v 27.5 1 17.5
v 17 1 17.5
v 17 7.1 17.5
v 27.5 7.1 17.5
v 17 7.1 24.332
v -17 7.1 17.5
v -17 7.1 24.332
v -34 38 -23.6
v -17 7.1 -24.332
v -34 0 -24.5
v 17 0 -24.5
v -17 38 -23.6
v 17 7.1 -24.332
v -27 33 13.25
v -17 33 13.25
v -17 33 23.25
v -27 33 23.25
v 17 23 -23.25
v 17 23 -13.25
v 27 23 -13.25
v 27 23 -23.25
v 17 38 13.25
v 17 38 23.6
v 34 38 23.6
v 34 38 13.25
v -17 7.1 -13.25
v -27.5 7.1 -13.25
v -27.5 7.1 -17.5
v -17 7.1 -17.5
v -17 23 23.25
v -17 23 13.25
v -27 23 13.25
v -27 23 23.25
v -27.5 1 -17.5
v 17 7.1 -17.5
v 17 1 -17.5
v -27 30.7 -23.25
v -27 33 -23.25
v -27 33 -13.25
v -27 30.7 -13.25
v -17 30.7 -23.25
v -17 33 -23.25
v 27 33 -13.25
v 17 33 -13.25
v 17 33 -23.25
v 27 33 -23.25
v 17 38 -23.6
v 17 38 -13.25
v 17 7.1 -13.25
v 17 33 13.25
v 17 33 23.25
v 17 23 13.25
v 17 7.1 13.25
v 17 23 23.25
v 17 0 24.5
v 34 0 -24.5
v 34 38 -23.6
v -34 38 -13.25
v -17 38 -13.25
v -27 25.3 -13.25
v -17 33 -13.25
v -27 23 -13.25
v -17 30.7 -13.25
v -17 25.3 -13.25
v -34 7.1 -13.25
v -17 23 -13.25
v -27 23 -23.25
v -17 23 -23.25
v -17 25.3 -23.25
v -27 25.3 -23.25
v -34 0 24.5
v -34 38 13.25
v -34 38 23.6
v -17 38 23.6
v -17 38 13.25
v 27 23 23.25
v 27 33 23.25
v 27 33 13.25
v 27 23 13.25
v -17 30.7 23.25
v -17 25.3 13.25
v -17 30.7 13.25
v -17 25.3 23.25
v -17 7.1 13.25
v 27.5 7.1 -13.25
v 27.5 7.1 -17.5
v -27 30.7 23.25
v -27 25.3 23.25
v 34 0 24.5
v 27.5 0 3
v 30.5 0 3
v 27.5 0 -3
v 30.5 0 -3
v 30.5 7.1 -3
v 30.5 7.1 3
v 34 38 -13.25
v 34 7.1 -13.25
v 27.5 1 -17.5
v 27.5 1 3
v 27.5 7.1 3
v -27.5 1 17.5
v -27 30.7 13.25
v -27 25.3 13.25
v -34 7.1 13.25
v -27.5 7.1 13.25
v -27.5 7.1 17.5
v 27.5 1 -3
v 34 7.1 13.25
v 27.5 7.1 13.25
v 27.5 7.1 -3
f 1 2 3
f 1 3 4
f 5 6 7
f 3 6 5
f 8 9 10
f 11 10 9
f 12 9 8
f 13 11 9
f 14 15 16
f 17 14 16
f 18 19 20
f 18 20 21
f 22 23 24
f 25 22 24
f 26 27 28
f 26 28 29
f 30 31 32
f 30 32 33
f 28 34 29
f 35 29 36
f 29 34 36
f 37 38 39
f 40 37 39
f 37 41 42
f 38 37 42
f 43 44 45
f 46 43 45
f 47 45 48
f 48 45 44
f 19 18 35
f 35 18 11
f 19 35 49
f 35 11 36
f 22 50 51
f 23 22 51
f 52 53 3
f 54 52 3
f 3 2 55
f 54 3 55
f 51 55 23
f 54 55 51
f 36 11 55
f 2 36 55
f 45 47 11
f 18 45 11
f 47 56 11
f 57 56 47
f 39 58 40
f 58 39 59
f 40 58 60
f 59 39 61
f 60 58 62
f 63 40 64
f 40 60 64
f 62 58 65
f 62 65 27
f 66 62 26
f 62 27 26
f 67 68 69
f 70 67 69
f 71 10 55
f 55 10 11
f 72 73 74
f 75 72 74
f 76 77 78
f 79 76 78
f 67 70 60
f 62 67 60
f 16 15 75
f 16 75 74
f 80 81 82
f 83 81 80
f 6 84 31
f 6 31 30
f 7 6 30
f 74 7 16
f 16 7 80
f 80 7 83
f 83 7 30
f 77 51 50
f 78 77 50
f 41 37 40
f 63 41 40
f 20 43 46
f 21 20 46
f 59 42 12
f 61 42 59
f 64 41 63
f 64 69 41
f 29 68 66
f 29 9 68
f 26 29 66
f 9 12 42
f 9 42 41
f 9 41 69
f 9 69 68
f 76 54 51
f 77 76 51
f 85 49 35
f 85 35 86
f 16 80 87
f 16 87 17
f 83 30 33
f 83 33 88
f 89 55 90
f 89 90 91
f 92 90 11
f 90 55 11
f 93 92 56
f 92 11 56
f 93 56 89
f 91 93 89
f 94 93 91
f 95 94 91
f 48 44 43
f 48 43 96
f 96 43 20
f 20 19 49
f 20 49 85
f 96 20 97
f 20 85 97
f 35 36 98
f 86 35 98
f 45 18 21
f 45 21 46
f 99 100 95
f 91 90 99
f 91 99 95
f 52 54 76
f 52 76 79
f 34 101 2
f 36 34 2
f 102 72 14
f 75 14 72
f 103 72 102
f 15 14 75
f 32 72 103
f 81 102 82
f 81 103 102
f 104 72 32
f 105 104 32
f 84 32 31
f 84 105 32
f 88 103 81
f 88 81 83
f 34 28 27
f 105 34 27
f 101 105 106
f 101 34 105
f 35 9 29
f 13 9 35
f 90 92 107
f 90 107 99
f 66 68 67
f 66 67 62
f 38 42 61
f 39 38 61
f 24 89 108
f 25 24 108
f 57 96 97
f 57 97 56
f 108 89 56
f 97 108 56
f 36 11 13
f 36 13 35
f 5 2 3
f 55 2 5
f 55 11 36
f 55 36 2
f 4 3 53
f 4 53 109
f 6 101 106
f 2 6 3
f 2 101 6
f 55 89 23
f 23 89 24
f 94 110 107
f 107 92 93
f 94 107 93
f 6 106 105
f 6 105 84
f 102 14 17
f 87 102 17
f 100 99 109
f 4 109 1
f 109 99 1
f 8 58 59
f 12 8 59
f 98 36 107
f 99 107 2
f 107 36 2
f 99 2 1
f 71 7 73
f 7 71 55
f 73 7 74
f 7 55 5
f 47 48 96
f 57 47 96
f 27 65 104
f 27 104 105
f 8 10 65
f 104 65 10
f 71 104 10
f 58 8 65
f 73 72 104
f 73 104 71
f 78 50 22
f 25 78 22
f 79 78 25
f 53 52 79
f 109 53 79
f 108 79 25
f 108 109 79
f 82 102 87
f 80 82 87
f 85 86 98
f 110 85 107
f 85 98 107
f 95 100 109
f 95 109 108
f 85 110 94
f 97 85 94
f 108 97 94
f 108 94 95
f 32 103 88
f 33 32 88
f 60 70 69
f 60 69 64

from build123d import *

# Parameters (mm, degrees)
SKETCH3_W           = 68
SKETCH3_H           = 49
BOSS_EXTRUDE1_DEPTH = 7.1
SKETCH6_W           = 17
SKETCH6_H           = 11.25
BOSS_EXTRUDE2_DEPTH = 38
CUT_EXTRUDE2_START  = -17
SKETCH7_W           = 46.5
SKETCH7_H           = 10
CUT_EXTRUDE2_DEPTH  = 10
CUT_EXTRUDE3_START  = -17
SKETCH9_W           = 46.5
SKETCH9_H           = 10
CUT_EXTRUDE3_DEPTH  = 10
SKETCH10_W          = 11.25
SKETCH10_H          = 5.4
BOSS_EXTRUDE3_DEPTH = 17
CUT_EXTRUDE4_START  = -1
SKETCH11_W          = 55
SKETCH11_H          = 35
CUT_EXTRUDE4_DEPTH  = 6.1
CUT_EXTRUDE5_REACH  = 58.571
SKETCH12_W          = 3
SKETCH12_H          = 6
CUT_EXTRUDE9_DEPTH  = 82.659353414


with BuildPart() as part:
    # Sketch3 → Boss-Extrude1 (new body)
    with BuildSketch(Plane(origin=(0, 0, 0), x_dir=(1, 0, 0), z_dir=(0, 1, 0))):
        Rectangle(SKETCH3_W, SKETCH3_H)
    extrude(amount=BOSS_EXTRUDE1_DEPTH)

    # Sketch6 → Boss-Extrude2 (add)
    with BuildSketch(Plane.XZ):
        with Locations((25.5, 18.875)):
            Rectangle(SKETCH6_W, SKETCH6_H)
        with Locations((-25.5, 18.875)):
            Rectangle(SKETCH6_W, SKETCH6_H)
        with Locations((-25.5, -18.875)):
            Rectangle(SKETCH6_W, SKETCH6_H)
        with Locations((25.5, -18.875)):
            Rectangle(SKETCH6_W, SKETCH6_H)
    extrude(amount=-BOSS_EXTRUDE2_DEPTH)

    # Sketch7 → Cut-Extrude2 (cut)
    with BuildSketch(Plane(origin=(34, 0, 0), x_dir=(0, 0, -1), z_dir=(1, 0, 0)).offset(CUT_EXTRUDE2_START)):
        with Locations((0, 28)):
            Rectangle(SKETCH7_W, SKETCH7_H)
    extrude(amount=CUT_EXTRUDE2_DEPTH, mode=Mode.SUBTRACT)

    # Sketch9 → Cut-Extrude3 (cut)
    with BuildSketch(Plane.ZY.offset(34).offset(CUT_EXTRUDE3_START)):
        with Locations((0, 28)):
            Rectangle(SKETCH9_W, SKETCH9_H)
    extrude(amount=CUT_EXTRUDE3_DEPTH, mode=Mode.SUBTRACT)

    # Sketch10 → Boss-Extrude3 (add)
    with BuildSketch(Plane.ZY.offset(34)):
        with Locations((18.875, 28)):
            Rectangle(SKETCH10_W, SKETCH10_H)
        with Locations((-18.875, 28)):
            Rectangle(SKETCH10_W, SKETCH10_H)
    extrude(amount=-BOSS_EXTRUDE3_DEPTH)

    # Sketch11 → Cut-Extrude4 (cut)
    with BuildSketch(Plane.XZ.offset(CUT_EXTRUDE4_START)):
        Rectangle(SKETCH11_W, SKETCH11_H)
    extrude(amount=-CUT_EXTRUDE4_DEPTH, mode=Mode.SUBTRACT)

    # Sketch12 → Cut-Extrude5 (cut, up to next)
    with BuildSketch(Plane.XZ, mode=Mode.PRIVATE) as cut_extrude5_sk1:
        with Locations((29, 0)):
            Rectangle(SKETCH12_W, SKETCH12_H)
    cut_extrude5_tool1 = extrude(cut_extrude5_sk1.sketch, amount=-CUT_EXTRUDE5_REACH, mode=Mode.PRIVATE) & part.part
    add(cut_extrude5_tool1.solids().sort_by_distance((29, 0, 0))[0], mode=Mode.SUBTRACT)

    # Sketch13 → Cut-Extrude9 (cut, through all)
    with BuildSketch(Plane(origin=(34, 0, 0), x_dir=(0, 0, -1), z_dir=(1, 0, 0))):
        Polygon((-24.5, 0), (-23.6, 38), (-24.5, 38), align=None)
        Polygon((24.5, 0), (23.6, 38), (24.5, 38), align=None)
    extrude(amount=-CUT_EXTRUDE9_DEPTH, mode=Mode.SUBTRACT)


with BuildPart() as body_2:
    # Split1: the piece on the far side of the plane
    add(part.part)
    split(bisect_by=Plane(origin=(17, 0, 0), x_dir=(0, 0, 1), z_dir=(1, 0, 0)), keep=Keep.BOTTOM)


with BuildPart() as part_1:
    add(part.part)

    # Split1
    split(bisect_by=Plane(origin=(17, 0, 0), x_dir=(0, 0, 1), z_dir=(1, 0, 0)), keep=Keep.TOP)


solid = Compound([body_2.part, part_1.part])
